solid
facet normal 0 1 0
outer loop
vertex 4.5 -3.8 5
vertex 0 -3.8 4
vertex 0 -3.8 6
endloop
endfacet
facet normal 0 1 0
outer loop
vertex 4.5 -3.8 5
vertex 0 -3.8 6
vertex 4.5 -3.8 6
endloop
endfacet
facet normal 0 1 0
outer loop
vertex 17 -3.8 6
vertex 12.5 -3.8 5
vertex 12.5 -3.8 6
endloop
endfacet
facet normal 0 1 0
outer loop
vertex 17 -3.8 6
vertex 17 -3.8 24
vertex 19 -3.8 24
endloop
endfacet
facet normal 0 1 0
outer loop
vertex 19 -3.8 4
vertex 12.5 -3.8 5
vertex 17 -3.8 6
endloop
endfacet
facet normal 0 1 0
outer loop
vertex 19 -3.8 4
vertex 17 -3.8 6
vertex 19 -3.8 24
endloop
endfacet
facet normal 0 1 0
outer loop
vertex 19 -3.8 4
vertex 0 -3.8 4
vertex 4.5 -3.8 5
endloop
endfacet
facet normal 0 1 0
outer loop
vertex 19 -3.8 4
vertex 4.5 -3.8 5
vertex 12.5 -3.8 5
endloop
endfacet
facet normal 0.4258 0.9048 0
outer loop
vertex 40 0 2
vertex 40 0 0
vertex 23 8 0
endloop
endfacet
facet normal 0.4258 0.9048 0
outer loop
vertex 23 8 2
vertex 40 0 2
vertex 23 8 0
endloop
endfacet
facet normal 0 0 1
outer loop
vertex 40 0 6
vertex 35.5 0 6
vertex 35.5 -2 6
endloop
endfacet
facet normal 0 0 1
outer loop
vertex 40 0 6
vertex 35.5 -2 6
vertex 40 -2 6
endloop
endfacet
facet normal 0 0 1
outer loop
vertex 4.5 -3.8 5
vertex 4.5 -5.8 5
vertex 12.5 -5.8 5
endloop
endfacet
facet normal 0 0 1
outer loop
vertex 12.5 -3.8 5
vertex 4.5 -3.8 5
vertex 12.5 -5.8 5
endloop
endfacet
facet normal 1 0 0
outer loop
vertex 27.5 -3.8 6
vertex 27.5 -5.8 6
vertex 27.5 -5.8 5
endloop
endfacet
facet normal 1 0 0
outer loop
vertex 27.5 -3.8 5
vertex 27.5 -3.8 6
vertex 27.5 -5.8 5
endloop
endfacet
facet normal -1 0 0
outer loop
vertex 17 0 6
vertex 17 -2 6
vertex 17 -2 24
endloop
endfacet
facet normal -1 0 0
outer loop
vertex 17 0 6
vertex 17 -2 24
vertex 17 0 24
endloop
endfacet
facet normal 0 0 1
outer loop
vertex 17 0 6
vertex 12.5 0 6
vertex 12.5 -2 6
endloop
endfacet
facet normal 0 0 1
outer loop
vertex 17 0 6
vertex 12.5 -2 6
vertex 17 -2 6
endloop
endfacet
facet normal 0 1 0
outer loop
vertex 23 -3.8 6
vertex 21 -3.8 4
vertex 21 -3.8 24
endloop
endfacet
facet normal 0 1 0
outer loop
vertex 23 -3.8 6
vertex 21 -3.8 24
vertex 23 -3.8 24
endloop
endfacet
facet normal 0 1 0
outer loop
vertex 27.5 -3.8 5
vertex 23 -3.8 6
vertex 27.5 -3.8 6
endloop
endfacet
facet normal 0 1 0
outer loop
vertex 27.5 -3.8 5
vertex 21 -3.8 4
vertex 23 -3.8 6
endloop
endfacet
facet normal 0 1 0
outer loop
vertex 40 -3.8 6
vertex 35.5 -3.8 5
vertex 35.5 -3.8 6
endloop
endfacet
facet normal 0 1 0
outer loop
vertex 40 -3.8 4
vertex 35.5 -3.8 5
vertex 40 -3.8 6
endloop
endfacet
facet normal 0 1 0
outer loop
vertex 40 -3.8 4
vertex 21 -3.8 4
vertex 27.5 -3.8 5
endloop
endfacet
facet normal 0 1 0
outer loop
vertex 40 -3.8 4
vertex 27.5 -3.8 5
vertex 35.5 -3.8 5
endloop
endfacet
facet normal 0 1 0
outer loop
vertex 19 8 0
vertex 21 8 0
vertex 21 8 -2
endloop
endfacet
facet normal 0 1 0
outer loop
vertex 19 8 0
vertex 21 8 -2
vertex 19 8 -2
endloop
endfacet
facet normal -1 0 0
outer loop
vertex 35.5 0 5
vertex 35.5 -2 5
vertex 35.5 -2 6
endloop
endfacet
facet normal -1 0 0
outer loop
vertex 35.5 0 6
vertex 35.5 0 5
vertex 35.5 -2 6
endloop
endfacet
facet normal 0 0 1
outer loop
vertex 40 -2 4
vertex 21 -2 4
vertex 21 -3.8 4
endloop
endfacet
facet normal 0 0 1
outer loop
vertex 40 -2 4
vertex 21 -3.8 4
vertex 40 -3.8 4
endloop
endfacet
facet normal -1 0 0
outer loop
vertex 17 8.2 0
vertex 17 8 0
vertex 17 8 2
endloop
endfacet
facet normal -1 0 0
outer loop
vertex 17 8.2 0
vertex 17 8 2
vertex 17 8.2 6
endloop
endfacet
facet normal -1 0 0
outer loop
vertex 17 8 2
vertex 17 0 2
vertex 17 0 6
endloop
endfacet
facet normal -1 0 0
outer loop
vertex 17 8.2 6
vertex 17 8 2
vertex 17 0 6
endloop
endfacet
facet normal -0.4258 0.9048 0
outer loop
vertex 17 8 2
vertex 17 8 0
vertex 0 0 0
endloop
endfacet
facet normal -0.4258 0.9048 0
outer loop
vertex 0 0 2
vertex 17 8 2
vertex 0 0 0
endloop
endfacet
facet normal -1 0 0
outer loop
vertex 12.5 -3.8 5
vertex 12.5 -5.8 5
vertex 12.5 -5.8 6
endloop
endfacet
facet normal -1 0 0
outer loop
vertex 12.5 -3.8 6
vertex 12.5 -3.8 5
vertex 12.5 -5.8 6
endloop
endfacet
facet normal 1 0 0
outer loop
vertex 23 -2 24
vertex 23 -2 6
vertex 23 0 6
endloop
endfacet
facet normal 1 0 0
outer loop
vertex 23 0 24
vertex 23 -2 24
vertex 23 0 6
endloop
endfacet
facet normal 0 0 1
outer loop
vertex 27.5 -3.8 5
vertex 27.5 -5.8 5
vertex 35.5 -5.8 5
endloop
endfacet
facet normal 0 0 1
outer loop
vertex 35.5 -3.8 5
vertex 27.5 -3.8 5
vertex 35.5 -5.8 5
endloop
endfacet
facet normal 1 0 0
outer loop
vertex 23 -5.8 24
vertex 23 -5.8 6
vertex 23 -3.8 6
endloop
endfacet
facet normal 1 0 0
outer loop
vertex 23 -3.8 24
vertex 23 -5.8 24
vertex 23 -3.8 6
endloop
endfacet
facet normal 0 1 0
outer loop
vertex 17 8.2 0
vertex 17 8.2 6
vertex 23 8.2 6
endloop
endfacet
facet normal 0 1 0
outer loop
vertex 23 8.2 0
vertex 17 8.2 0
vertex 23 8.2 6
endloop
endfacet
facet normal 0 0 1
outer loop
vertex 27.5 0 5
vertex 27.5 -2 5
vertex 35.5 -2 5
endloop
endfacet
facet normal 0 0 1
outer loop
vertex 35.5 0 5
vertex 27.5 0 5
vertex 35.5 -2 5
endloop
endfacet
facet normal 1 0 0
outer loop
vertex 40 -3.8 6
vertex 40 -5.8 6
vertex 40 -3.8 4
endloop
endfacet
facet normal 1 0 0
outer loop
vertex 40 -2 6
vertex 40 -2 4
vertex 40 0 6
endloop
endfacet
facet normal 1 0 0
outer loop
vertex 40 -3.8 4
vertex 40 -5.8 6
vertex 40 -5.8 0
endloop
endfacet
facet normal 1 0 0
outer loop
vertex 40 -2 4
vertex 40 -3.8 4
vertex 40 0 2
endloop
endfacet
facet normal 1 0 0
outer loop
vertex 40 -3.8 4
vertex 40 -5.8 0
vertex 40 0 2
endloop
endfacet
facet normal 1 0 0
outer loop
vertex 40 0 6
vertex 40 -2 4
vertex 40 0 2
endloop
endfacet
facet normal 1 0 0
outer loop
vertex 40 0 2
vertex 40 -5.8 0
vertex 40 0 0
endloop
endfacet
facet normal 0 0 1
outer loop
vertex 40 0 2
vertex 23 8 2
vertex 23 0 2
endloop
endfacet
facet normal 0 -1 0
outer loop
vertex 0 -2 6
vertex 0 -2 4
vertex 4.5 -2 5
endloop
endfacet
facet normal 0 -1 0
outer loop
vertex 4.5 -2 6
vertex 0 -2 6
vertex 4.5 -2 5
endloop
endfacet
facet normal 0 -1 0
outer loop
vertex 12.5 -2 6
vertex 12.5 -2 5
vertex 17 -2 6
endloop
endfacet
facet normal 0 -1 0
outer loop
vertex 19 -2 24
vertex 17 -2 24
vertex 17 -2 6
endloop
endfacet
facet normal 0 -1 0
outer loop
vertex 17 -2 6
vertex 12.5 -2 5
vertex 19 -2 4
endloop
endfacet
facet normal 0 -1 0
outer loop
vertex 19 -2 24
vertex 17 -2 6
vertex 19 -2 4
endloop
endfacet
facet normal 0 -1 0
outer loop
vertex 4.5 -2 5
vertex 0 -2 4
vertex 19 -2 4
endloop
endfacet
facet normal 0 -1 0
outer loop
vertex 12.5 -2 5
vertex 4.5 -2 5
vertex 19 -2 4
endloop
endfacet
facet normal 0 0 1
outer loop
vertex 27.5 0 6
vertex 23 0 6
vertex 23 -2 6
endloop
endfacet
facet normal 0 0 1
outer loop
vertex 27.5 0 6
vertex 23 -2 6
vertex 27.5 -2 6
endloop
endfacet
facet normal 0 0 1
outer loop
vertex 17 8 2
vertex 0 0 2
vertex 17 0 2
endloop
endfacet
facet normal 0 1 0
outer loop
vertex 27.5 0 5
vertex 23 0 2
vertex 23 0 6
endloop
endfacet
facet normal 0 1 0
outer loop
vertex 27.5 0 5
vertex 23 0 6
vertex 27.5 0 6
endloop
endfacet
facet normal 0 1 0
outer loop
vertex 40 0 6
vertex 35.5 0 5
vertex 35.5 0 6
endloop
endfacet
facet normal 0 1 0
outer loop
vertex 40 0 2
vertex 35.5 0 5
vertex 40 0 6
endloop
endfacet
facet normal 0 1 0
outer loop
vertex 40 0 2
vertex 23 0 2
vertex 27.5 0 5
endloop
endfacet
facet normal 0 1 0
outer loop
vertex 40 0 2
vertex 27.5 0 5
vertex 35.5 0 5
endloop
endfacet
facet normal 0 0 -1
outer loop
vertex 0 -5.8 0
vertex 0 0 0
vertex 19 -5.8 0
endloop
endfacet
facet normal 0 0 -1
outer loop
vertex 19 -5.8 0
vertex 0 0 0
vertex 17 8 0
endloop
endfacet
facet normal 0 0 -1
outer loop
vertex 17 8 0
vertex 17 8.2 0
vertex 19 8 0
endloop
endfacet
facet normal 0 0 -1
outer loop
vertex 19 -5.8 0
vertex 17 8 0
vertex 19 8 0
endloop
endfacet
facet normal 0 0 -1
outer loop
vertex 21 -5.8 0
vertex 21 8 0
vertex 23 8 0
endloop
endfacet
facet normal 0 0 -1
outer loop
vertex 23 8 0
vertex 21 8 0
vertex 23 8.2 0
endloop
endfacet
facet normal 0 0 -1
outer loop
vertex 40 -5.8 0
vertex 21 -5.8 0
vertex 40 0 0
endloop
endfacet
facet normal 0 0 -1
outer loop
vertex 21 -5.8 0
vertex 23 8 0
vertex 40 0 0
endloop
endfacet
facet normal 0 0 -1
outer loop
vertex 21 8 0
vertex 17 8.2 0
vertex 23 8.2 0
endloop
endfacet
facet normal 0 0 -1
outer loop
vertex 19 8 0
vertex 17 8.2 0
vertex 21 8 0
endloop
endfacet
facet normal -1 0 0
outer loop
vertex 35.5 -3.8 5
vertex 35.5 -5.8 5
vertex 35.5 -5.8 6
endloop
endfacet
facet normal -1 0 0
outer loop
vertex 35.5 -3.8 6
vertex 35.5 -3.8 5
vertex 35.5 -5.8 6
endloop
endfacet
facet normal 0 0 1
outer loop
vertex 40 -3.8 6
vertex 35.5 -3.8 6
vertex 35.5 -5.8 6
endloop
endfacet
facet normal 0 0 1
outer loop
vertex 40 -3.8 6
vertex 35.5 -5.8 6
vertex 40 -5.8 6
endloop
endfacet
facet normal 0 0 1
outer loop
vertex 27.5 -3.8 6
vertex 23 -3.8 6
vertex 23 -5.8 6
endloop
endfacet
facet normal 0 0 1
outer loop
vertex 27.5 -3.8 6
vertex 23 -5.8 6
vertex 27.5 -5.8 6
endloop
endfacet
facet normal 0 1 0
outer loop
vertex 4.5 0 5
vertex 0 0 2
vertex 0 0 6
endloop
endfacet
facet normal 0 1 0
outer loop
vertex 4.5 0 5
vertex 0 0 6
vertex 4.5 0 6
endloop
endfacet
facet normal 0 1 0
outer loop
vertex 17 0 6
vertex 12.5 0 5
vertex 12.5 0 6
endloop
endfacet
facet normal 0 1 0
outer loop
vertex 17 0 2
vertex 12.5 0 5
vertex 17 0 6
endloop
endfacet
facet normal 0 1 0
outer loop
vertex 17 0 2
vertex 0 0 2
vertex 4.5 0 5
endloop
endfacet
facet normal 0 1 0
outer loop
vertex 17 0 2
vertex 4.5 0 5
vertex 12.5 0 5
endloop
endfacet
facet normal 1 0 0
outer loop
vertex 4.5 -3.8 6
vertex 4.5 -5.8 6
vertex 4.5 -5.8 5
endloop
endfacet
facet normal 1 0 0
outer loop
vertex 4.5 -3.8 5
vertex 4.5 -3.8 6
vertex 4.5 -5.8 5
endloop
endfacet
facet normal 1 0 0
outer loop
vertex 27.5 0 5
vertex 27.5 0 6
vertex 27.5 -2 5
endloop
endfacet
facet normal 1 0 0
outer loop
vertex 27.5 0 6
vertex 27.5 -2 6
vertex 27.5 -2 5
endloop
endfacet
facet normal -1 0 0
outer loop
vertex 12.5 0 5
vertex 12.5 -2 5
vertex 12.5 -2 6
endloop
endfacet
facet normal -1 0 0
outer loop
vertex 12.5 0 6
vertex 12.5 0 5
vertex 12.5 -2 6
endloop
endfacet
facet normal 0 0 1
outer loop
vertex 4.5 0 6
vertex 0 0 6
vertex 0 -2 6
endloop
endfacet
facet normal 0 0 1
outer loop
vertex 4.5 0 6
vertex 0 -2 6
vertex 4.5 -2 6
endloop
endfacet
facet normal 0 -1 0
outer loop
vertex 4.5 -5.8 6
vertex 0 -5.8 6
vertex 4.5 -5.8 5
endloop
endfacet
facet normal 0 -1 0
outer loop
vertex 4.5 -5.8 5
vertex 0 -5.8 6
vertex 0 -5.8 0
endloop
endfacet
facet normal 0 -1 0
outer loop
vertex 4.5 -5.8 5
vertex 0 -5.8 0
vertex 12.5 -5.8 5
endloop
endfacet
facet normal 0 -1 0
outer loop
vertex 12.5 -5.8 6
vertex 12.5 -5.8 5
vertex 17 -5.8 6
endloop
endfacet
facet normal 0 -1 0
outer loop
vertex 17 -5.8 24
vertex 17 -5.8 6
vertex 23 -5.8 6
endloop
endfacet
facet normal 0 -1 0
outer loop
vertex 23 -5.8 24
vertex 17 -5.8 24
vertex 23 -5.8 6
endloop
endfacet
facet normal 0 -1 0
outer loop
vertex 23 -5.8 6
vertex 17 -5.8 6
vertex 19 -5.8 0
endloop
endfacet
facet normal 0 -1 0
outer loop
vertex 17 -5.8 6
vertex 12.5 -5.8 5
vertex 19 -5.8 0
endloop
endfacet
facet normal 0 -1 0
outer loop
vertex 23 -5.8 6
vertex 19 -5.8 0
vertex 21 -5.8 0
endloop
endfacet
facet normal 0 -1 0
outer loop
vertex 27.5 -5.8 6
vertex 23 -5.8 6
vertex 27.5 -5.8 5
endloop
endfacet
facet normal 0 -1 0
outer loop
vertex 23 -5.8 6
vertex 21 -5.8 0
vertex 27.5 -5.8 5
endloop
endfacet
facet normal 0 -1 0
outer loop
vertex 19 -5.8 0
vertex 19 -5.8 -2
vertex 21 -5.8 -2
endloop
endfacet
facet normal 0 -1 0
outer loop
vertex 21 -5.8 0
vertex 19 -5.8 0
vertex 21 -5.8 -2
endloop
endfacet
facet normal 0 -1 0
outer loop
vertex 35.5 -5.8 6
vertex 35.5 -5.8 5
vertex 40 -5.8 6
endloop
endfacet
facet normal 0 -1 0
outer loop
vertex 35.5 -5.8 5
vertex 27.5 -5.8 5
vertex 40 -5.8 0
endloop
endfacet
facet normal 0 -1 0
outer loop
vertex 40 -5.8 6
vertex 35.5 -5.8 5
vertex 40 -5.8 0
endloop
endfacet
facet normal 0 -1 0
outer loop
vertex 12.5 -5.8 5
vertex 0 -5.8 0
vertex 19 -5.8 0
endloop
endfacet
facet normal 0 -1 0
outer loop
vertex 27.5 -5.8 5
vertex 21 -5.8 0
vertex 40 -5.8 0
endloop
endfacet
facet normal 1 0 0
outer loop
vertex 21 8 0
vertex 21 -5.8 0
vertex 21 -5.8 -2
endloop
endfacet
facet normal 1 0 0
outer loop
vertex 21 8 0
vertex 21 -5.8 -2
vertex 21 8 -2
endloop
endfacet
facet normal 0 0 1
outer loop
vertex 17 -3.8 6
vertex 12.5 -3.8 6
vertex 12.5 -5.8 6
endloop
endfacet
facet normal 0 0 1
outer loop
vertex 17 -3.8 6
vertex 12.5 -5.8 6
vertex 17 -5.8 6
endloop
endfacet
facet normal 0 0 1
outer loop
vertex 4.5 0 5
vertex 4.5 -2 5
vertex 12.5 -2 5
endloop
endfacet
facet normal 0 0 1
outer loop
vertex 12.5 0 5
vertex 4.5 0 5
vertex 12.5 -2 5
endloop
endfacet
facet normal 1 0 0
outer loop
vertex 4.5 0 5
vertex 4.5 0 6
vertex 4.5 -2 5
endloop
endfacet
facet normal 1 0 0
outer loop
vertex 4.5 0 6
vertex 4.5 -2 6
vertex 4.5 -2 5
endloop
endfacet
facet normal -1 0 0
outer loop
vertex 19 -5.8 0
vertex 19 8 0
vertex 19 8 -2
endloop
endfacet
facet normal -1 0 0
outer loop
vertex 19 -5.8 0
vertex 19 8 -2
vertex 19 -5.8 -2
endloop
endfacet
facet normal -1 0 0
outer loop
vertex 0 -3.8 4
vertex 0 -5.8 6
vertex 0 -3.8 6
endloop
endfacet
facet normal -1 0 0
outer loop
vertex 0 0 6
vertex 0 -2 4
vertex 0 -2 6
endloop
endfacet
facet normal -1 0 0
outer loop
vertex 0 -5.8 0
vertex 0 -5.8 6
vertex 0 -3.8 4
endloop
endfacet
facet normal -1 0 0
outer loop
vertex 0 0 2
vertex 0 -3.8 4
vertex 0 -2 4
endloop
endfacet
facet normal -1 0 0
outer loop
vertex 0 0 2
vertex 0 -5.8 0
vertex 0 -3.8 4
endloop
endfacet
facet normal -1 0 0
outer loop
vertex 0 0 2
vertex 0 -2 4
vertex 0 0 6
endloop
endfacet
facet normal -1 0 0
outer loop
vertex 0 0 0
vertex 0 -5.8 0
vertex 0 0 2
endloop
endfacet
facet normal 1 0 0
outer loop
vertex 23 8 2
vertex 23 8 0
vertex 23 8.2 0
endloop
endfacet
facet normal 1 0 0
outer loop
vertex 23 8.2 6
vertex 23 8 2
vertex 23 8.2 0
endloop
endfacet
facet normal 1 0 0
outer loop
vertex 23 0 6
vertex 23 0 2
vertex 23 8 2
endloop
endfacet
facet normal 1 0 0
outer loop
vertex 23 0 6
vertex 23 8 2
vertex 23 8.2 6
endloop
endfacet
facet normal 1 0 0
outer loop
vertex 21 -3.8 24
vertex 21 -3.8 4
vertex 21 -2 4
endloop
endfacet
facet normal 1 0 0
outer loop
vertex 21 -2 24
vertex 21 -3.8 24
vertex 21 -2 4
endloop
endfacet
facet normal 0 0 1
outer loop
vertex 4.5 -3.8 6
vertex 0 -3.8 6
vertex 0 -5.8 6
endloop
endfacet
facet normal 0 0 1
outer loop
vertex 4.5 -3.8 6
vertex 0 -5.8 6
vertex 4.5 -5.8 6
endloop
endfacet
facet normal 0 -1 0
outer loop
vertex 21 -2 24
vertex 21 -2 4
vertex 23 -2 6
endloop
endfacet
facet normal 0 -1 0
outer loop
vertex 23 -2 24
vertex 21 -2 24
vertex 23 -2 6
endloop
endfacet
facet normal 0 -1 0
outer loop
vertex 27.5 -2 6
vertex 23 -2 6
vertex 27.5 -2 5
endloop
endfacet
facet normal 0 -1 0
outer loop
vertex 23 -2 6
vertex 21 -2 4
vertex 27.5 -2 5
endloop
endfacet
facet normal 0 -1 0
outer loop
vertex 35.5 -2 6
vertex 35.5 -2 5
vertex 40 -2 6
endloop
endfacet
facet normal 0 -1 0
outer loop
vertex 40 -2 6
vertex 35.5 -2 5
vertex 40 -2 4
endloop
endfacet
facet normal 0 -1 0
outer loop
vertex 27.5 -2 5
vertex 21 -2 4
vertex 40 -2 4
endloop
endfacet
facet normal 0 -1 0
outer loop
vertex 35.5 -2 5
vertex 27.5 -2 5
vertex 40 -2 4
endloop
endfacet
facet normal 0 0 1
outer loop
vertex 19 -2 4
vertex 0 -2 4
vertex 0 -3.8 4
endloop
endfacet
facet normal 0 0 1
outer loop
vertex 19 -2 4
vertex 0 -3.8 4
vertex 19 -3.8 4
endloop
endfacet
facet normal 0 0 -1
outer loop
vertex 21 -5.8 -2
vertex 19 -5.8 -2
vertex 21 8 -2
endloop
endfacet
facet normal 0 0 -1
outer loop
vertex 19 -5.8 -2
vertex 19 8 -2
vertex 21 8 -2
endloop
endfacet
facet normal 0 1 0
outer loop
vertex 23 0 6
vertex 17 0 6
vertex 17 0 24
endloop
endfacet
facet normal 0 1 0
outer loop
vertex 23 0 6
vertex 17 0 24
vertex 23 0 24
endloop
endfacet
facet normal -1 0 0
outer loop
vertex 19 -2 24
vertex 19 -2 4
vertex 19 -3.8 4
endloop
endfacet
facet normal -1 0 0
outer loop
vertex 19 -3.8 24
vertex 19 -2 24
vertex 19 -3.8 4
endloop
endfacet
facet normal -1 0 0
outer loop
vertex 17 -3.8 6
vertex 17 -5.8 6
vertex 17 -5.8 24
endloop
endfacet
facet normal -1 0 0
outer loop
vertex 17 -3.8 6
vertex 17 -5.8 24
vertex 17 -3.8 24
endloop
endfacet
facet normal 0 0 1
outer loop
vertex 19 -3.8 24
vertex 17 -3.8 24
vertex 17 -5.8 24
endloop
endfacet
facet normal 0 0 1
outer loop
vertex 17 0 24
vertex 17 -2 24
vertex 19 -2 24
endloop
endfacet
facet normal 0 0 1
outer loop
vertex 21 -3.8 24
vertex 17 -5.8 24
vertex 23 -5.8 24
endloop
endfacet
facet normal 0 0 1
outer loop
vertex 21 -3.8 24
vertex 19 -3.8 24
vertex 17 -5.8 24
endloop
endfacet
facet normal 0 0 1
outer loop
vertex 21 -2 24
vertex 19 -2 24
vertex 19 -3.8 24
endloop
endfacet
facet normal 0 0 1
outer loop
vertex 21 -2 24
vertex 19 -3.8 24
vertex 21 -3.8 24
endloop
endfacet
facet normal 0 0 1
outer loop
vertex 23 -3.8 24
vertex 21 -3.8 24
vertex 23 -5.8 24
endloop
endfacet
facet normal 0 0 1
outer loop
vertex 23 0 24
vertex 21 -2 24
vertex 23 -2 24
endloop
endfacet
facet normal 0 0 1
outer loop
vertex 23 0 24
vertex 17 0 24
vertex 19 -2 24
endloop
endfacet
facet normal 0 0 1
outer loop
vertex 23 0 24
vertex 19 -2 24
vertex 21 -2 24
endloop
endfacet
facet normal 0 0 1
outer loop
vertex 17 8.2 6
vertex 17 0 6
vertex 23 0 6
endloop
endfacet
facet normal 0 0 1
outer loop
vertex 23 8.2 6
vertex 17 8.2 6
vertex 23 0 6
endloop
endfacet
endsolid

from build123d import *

# Parameters (mm, degrees)
F0_W      = 2
F0_H      = 2
F1_DEPTH  = 24
F0_W_2    = 17
F2_DEPTH  = 6
F0_H_2    = 1.8
F3_DEPTH  = 4
F4_W      = 6
F4_H      = 6
F5_DEPTH  = 14
F6_DEPTH  = 2
F7_DEPTH  = 2
F8_DEPTH  = 2
F9_W      = 8
F9_H      = 1
F10_DEPTH = 6
F11_DEPTH = 2
F12_DEPTH = 2


with BuildPart() as f1:
    # F0 (on Top) → F1 (new body)
    with BuildSketch(Plane.XY):
        with Locations((18, -1)):
            Rectangle(F0_W, F0_H)
        Polygon((20, 0), (19, 0), (19, -2), (20, -2), (21, -2), (21, 0), align=None)
        with Locations((22, -1)):
            Rectangle(F0_W, F0_H)
        Polygon((20, -2), (19, -2), (19, -3.8), (20, -3.8), (21, -3.8), (21, -2), align=None)
        with Locations((18, -4.8)):
            Rectangle(F0_W, F0_H)
        Polygon((20, -3.8), (19, -3.8), (19, -5.8), (20, -5.8), (21, -5.8), (21, -3.8), align=None)
        with Locations((22, -4.8)):
            Rectangle(F0_W, F0_H)
    extrude(amount=F1_DEPTH)

    # F0 (on Top) → F2 (join)
    with BuildSketch(Plane.XY):
        with Locations((8.5, -1)):
            Rectangle(F0_W_2, F0_H)
        with Locations((8.5, -4.8)):
            Rectangle(F0_W_2, F0_H)
        with Locations((31.5, -1)):
            Rectangle(F0_W_2, F0_H)
        with Locations((31.5, -4.8)):
            Rectangle(F0_W_2, F0_H)
    extrude(amount=F2_DEPTH)

    # F0 (on Top) → F3 (join)
    with BuildSketch(Plane.XY):
        with Locations((8.5, -2.9)):
            Rectangle(F0_W_2, F0_H_2)
        with Locations((18, -2.9)):
            Rectangle(F0_W, F0_H_2)
        with Locations((22, -2.9)):
            Rectangle(F0_W, F0_H_2)
        with Locations((31.5, -2.9)):
            Rectangle(F0_W_2, F0_H_2)
    extrude(amount=F3_DEPTH)

    # F4 (on face) → F5 (join)
    with BuildSketch(Plane.XZ.offset(5.8)):
        with Locations((20, 3)):
            Rectangle(F4_W, F4_H)
    extrude(amount=-F5_DEPTH)

    # F0 (on Top) → F6 (join)
    with BuildSketch(Plane.XY):
        Polygon((20, -3.8), (19, -3.8), (19, -5.8), (20, -5.8), (21, -5.8), (21, -3.8), align=None)
        Polygon((20, -2), (19, -2), (19, -3.8), (20, -3.8), (21, -3.8), (21, -2), align=None)
        Polygon((20, 0), (19, 0), (19, -2), (20, -2), (21, -2), (21, 0), align=None)
        Polygon((19, 8), (19, 0), (20, 0), (21, 0), (21, 8), align=None)
    extrude(amount=-F6_DEPTH)

    # F7 (cut): a face of the model
    f7_faces = [f1.faces().sort_by_distance(p)[0] for p in [
        (17, -2.9, 5),
    ]]
    extrude(f7_faces, amount=-F7_DEPTH, mode=Mode.SUBTRACT)

    # F8 (cut): a face of the model
    f8_faces = [f1.faces().sort_by_distance(p)[0] for p in [
        (23, -2.9, 5),
    ]]
    extrude(f8_faces, amount=-F8_DEPTH, mode=Mode.SUBTRACT)

    # F9 (on face) → F10 (cut)
    with BuildSketch(Plane.XZ.offset(5.8)):
        with Locations((8.5, 5.5)):
            Rectangle(F9_W, F9_H)
        with Locations((8.5, 6.5)):
            Rectangle(F9_W, F9_H)
        with Locations((31.5, 6.5)):
            Rectangle(F9_W, F9_H)
        with Locations((31.5, 5.5)):
            Rectangle(F9_W, F9_H)
    extrude(amount=-F10_DEPTH, mode=Mode.SUBTRACT)

    # F0 (on Top) → F11 (join)
    with BuildSketch(Plane.XY):
        Polygon((17, 8), (0, 0), (17, 0), align=None)
    extrude(amount=F11_DEPTH)

    # F0 (on Top) → F12 (join)
    with BuildSketch(Plane.XY):
        Polygon((40, 0), (23, 8), (23, 0), align=None)
    extrude(amount=F12_DEPTH)


solid = f1.part
